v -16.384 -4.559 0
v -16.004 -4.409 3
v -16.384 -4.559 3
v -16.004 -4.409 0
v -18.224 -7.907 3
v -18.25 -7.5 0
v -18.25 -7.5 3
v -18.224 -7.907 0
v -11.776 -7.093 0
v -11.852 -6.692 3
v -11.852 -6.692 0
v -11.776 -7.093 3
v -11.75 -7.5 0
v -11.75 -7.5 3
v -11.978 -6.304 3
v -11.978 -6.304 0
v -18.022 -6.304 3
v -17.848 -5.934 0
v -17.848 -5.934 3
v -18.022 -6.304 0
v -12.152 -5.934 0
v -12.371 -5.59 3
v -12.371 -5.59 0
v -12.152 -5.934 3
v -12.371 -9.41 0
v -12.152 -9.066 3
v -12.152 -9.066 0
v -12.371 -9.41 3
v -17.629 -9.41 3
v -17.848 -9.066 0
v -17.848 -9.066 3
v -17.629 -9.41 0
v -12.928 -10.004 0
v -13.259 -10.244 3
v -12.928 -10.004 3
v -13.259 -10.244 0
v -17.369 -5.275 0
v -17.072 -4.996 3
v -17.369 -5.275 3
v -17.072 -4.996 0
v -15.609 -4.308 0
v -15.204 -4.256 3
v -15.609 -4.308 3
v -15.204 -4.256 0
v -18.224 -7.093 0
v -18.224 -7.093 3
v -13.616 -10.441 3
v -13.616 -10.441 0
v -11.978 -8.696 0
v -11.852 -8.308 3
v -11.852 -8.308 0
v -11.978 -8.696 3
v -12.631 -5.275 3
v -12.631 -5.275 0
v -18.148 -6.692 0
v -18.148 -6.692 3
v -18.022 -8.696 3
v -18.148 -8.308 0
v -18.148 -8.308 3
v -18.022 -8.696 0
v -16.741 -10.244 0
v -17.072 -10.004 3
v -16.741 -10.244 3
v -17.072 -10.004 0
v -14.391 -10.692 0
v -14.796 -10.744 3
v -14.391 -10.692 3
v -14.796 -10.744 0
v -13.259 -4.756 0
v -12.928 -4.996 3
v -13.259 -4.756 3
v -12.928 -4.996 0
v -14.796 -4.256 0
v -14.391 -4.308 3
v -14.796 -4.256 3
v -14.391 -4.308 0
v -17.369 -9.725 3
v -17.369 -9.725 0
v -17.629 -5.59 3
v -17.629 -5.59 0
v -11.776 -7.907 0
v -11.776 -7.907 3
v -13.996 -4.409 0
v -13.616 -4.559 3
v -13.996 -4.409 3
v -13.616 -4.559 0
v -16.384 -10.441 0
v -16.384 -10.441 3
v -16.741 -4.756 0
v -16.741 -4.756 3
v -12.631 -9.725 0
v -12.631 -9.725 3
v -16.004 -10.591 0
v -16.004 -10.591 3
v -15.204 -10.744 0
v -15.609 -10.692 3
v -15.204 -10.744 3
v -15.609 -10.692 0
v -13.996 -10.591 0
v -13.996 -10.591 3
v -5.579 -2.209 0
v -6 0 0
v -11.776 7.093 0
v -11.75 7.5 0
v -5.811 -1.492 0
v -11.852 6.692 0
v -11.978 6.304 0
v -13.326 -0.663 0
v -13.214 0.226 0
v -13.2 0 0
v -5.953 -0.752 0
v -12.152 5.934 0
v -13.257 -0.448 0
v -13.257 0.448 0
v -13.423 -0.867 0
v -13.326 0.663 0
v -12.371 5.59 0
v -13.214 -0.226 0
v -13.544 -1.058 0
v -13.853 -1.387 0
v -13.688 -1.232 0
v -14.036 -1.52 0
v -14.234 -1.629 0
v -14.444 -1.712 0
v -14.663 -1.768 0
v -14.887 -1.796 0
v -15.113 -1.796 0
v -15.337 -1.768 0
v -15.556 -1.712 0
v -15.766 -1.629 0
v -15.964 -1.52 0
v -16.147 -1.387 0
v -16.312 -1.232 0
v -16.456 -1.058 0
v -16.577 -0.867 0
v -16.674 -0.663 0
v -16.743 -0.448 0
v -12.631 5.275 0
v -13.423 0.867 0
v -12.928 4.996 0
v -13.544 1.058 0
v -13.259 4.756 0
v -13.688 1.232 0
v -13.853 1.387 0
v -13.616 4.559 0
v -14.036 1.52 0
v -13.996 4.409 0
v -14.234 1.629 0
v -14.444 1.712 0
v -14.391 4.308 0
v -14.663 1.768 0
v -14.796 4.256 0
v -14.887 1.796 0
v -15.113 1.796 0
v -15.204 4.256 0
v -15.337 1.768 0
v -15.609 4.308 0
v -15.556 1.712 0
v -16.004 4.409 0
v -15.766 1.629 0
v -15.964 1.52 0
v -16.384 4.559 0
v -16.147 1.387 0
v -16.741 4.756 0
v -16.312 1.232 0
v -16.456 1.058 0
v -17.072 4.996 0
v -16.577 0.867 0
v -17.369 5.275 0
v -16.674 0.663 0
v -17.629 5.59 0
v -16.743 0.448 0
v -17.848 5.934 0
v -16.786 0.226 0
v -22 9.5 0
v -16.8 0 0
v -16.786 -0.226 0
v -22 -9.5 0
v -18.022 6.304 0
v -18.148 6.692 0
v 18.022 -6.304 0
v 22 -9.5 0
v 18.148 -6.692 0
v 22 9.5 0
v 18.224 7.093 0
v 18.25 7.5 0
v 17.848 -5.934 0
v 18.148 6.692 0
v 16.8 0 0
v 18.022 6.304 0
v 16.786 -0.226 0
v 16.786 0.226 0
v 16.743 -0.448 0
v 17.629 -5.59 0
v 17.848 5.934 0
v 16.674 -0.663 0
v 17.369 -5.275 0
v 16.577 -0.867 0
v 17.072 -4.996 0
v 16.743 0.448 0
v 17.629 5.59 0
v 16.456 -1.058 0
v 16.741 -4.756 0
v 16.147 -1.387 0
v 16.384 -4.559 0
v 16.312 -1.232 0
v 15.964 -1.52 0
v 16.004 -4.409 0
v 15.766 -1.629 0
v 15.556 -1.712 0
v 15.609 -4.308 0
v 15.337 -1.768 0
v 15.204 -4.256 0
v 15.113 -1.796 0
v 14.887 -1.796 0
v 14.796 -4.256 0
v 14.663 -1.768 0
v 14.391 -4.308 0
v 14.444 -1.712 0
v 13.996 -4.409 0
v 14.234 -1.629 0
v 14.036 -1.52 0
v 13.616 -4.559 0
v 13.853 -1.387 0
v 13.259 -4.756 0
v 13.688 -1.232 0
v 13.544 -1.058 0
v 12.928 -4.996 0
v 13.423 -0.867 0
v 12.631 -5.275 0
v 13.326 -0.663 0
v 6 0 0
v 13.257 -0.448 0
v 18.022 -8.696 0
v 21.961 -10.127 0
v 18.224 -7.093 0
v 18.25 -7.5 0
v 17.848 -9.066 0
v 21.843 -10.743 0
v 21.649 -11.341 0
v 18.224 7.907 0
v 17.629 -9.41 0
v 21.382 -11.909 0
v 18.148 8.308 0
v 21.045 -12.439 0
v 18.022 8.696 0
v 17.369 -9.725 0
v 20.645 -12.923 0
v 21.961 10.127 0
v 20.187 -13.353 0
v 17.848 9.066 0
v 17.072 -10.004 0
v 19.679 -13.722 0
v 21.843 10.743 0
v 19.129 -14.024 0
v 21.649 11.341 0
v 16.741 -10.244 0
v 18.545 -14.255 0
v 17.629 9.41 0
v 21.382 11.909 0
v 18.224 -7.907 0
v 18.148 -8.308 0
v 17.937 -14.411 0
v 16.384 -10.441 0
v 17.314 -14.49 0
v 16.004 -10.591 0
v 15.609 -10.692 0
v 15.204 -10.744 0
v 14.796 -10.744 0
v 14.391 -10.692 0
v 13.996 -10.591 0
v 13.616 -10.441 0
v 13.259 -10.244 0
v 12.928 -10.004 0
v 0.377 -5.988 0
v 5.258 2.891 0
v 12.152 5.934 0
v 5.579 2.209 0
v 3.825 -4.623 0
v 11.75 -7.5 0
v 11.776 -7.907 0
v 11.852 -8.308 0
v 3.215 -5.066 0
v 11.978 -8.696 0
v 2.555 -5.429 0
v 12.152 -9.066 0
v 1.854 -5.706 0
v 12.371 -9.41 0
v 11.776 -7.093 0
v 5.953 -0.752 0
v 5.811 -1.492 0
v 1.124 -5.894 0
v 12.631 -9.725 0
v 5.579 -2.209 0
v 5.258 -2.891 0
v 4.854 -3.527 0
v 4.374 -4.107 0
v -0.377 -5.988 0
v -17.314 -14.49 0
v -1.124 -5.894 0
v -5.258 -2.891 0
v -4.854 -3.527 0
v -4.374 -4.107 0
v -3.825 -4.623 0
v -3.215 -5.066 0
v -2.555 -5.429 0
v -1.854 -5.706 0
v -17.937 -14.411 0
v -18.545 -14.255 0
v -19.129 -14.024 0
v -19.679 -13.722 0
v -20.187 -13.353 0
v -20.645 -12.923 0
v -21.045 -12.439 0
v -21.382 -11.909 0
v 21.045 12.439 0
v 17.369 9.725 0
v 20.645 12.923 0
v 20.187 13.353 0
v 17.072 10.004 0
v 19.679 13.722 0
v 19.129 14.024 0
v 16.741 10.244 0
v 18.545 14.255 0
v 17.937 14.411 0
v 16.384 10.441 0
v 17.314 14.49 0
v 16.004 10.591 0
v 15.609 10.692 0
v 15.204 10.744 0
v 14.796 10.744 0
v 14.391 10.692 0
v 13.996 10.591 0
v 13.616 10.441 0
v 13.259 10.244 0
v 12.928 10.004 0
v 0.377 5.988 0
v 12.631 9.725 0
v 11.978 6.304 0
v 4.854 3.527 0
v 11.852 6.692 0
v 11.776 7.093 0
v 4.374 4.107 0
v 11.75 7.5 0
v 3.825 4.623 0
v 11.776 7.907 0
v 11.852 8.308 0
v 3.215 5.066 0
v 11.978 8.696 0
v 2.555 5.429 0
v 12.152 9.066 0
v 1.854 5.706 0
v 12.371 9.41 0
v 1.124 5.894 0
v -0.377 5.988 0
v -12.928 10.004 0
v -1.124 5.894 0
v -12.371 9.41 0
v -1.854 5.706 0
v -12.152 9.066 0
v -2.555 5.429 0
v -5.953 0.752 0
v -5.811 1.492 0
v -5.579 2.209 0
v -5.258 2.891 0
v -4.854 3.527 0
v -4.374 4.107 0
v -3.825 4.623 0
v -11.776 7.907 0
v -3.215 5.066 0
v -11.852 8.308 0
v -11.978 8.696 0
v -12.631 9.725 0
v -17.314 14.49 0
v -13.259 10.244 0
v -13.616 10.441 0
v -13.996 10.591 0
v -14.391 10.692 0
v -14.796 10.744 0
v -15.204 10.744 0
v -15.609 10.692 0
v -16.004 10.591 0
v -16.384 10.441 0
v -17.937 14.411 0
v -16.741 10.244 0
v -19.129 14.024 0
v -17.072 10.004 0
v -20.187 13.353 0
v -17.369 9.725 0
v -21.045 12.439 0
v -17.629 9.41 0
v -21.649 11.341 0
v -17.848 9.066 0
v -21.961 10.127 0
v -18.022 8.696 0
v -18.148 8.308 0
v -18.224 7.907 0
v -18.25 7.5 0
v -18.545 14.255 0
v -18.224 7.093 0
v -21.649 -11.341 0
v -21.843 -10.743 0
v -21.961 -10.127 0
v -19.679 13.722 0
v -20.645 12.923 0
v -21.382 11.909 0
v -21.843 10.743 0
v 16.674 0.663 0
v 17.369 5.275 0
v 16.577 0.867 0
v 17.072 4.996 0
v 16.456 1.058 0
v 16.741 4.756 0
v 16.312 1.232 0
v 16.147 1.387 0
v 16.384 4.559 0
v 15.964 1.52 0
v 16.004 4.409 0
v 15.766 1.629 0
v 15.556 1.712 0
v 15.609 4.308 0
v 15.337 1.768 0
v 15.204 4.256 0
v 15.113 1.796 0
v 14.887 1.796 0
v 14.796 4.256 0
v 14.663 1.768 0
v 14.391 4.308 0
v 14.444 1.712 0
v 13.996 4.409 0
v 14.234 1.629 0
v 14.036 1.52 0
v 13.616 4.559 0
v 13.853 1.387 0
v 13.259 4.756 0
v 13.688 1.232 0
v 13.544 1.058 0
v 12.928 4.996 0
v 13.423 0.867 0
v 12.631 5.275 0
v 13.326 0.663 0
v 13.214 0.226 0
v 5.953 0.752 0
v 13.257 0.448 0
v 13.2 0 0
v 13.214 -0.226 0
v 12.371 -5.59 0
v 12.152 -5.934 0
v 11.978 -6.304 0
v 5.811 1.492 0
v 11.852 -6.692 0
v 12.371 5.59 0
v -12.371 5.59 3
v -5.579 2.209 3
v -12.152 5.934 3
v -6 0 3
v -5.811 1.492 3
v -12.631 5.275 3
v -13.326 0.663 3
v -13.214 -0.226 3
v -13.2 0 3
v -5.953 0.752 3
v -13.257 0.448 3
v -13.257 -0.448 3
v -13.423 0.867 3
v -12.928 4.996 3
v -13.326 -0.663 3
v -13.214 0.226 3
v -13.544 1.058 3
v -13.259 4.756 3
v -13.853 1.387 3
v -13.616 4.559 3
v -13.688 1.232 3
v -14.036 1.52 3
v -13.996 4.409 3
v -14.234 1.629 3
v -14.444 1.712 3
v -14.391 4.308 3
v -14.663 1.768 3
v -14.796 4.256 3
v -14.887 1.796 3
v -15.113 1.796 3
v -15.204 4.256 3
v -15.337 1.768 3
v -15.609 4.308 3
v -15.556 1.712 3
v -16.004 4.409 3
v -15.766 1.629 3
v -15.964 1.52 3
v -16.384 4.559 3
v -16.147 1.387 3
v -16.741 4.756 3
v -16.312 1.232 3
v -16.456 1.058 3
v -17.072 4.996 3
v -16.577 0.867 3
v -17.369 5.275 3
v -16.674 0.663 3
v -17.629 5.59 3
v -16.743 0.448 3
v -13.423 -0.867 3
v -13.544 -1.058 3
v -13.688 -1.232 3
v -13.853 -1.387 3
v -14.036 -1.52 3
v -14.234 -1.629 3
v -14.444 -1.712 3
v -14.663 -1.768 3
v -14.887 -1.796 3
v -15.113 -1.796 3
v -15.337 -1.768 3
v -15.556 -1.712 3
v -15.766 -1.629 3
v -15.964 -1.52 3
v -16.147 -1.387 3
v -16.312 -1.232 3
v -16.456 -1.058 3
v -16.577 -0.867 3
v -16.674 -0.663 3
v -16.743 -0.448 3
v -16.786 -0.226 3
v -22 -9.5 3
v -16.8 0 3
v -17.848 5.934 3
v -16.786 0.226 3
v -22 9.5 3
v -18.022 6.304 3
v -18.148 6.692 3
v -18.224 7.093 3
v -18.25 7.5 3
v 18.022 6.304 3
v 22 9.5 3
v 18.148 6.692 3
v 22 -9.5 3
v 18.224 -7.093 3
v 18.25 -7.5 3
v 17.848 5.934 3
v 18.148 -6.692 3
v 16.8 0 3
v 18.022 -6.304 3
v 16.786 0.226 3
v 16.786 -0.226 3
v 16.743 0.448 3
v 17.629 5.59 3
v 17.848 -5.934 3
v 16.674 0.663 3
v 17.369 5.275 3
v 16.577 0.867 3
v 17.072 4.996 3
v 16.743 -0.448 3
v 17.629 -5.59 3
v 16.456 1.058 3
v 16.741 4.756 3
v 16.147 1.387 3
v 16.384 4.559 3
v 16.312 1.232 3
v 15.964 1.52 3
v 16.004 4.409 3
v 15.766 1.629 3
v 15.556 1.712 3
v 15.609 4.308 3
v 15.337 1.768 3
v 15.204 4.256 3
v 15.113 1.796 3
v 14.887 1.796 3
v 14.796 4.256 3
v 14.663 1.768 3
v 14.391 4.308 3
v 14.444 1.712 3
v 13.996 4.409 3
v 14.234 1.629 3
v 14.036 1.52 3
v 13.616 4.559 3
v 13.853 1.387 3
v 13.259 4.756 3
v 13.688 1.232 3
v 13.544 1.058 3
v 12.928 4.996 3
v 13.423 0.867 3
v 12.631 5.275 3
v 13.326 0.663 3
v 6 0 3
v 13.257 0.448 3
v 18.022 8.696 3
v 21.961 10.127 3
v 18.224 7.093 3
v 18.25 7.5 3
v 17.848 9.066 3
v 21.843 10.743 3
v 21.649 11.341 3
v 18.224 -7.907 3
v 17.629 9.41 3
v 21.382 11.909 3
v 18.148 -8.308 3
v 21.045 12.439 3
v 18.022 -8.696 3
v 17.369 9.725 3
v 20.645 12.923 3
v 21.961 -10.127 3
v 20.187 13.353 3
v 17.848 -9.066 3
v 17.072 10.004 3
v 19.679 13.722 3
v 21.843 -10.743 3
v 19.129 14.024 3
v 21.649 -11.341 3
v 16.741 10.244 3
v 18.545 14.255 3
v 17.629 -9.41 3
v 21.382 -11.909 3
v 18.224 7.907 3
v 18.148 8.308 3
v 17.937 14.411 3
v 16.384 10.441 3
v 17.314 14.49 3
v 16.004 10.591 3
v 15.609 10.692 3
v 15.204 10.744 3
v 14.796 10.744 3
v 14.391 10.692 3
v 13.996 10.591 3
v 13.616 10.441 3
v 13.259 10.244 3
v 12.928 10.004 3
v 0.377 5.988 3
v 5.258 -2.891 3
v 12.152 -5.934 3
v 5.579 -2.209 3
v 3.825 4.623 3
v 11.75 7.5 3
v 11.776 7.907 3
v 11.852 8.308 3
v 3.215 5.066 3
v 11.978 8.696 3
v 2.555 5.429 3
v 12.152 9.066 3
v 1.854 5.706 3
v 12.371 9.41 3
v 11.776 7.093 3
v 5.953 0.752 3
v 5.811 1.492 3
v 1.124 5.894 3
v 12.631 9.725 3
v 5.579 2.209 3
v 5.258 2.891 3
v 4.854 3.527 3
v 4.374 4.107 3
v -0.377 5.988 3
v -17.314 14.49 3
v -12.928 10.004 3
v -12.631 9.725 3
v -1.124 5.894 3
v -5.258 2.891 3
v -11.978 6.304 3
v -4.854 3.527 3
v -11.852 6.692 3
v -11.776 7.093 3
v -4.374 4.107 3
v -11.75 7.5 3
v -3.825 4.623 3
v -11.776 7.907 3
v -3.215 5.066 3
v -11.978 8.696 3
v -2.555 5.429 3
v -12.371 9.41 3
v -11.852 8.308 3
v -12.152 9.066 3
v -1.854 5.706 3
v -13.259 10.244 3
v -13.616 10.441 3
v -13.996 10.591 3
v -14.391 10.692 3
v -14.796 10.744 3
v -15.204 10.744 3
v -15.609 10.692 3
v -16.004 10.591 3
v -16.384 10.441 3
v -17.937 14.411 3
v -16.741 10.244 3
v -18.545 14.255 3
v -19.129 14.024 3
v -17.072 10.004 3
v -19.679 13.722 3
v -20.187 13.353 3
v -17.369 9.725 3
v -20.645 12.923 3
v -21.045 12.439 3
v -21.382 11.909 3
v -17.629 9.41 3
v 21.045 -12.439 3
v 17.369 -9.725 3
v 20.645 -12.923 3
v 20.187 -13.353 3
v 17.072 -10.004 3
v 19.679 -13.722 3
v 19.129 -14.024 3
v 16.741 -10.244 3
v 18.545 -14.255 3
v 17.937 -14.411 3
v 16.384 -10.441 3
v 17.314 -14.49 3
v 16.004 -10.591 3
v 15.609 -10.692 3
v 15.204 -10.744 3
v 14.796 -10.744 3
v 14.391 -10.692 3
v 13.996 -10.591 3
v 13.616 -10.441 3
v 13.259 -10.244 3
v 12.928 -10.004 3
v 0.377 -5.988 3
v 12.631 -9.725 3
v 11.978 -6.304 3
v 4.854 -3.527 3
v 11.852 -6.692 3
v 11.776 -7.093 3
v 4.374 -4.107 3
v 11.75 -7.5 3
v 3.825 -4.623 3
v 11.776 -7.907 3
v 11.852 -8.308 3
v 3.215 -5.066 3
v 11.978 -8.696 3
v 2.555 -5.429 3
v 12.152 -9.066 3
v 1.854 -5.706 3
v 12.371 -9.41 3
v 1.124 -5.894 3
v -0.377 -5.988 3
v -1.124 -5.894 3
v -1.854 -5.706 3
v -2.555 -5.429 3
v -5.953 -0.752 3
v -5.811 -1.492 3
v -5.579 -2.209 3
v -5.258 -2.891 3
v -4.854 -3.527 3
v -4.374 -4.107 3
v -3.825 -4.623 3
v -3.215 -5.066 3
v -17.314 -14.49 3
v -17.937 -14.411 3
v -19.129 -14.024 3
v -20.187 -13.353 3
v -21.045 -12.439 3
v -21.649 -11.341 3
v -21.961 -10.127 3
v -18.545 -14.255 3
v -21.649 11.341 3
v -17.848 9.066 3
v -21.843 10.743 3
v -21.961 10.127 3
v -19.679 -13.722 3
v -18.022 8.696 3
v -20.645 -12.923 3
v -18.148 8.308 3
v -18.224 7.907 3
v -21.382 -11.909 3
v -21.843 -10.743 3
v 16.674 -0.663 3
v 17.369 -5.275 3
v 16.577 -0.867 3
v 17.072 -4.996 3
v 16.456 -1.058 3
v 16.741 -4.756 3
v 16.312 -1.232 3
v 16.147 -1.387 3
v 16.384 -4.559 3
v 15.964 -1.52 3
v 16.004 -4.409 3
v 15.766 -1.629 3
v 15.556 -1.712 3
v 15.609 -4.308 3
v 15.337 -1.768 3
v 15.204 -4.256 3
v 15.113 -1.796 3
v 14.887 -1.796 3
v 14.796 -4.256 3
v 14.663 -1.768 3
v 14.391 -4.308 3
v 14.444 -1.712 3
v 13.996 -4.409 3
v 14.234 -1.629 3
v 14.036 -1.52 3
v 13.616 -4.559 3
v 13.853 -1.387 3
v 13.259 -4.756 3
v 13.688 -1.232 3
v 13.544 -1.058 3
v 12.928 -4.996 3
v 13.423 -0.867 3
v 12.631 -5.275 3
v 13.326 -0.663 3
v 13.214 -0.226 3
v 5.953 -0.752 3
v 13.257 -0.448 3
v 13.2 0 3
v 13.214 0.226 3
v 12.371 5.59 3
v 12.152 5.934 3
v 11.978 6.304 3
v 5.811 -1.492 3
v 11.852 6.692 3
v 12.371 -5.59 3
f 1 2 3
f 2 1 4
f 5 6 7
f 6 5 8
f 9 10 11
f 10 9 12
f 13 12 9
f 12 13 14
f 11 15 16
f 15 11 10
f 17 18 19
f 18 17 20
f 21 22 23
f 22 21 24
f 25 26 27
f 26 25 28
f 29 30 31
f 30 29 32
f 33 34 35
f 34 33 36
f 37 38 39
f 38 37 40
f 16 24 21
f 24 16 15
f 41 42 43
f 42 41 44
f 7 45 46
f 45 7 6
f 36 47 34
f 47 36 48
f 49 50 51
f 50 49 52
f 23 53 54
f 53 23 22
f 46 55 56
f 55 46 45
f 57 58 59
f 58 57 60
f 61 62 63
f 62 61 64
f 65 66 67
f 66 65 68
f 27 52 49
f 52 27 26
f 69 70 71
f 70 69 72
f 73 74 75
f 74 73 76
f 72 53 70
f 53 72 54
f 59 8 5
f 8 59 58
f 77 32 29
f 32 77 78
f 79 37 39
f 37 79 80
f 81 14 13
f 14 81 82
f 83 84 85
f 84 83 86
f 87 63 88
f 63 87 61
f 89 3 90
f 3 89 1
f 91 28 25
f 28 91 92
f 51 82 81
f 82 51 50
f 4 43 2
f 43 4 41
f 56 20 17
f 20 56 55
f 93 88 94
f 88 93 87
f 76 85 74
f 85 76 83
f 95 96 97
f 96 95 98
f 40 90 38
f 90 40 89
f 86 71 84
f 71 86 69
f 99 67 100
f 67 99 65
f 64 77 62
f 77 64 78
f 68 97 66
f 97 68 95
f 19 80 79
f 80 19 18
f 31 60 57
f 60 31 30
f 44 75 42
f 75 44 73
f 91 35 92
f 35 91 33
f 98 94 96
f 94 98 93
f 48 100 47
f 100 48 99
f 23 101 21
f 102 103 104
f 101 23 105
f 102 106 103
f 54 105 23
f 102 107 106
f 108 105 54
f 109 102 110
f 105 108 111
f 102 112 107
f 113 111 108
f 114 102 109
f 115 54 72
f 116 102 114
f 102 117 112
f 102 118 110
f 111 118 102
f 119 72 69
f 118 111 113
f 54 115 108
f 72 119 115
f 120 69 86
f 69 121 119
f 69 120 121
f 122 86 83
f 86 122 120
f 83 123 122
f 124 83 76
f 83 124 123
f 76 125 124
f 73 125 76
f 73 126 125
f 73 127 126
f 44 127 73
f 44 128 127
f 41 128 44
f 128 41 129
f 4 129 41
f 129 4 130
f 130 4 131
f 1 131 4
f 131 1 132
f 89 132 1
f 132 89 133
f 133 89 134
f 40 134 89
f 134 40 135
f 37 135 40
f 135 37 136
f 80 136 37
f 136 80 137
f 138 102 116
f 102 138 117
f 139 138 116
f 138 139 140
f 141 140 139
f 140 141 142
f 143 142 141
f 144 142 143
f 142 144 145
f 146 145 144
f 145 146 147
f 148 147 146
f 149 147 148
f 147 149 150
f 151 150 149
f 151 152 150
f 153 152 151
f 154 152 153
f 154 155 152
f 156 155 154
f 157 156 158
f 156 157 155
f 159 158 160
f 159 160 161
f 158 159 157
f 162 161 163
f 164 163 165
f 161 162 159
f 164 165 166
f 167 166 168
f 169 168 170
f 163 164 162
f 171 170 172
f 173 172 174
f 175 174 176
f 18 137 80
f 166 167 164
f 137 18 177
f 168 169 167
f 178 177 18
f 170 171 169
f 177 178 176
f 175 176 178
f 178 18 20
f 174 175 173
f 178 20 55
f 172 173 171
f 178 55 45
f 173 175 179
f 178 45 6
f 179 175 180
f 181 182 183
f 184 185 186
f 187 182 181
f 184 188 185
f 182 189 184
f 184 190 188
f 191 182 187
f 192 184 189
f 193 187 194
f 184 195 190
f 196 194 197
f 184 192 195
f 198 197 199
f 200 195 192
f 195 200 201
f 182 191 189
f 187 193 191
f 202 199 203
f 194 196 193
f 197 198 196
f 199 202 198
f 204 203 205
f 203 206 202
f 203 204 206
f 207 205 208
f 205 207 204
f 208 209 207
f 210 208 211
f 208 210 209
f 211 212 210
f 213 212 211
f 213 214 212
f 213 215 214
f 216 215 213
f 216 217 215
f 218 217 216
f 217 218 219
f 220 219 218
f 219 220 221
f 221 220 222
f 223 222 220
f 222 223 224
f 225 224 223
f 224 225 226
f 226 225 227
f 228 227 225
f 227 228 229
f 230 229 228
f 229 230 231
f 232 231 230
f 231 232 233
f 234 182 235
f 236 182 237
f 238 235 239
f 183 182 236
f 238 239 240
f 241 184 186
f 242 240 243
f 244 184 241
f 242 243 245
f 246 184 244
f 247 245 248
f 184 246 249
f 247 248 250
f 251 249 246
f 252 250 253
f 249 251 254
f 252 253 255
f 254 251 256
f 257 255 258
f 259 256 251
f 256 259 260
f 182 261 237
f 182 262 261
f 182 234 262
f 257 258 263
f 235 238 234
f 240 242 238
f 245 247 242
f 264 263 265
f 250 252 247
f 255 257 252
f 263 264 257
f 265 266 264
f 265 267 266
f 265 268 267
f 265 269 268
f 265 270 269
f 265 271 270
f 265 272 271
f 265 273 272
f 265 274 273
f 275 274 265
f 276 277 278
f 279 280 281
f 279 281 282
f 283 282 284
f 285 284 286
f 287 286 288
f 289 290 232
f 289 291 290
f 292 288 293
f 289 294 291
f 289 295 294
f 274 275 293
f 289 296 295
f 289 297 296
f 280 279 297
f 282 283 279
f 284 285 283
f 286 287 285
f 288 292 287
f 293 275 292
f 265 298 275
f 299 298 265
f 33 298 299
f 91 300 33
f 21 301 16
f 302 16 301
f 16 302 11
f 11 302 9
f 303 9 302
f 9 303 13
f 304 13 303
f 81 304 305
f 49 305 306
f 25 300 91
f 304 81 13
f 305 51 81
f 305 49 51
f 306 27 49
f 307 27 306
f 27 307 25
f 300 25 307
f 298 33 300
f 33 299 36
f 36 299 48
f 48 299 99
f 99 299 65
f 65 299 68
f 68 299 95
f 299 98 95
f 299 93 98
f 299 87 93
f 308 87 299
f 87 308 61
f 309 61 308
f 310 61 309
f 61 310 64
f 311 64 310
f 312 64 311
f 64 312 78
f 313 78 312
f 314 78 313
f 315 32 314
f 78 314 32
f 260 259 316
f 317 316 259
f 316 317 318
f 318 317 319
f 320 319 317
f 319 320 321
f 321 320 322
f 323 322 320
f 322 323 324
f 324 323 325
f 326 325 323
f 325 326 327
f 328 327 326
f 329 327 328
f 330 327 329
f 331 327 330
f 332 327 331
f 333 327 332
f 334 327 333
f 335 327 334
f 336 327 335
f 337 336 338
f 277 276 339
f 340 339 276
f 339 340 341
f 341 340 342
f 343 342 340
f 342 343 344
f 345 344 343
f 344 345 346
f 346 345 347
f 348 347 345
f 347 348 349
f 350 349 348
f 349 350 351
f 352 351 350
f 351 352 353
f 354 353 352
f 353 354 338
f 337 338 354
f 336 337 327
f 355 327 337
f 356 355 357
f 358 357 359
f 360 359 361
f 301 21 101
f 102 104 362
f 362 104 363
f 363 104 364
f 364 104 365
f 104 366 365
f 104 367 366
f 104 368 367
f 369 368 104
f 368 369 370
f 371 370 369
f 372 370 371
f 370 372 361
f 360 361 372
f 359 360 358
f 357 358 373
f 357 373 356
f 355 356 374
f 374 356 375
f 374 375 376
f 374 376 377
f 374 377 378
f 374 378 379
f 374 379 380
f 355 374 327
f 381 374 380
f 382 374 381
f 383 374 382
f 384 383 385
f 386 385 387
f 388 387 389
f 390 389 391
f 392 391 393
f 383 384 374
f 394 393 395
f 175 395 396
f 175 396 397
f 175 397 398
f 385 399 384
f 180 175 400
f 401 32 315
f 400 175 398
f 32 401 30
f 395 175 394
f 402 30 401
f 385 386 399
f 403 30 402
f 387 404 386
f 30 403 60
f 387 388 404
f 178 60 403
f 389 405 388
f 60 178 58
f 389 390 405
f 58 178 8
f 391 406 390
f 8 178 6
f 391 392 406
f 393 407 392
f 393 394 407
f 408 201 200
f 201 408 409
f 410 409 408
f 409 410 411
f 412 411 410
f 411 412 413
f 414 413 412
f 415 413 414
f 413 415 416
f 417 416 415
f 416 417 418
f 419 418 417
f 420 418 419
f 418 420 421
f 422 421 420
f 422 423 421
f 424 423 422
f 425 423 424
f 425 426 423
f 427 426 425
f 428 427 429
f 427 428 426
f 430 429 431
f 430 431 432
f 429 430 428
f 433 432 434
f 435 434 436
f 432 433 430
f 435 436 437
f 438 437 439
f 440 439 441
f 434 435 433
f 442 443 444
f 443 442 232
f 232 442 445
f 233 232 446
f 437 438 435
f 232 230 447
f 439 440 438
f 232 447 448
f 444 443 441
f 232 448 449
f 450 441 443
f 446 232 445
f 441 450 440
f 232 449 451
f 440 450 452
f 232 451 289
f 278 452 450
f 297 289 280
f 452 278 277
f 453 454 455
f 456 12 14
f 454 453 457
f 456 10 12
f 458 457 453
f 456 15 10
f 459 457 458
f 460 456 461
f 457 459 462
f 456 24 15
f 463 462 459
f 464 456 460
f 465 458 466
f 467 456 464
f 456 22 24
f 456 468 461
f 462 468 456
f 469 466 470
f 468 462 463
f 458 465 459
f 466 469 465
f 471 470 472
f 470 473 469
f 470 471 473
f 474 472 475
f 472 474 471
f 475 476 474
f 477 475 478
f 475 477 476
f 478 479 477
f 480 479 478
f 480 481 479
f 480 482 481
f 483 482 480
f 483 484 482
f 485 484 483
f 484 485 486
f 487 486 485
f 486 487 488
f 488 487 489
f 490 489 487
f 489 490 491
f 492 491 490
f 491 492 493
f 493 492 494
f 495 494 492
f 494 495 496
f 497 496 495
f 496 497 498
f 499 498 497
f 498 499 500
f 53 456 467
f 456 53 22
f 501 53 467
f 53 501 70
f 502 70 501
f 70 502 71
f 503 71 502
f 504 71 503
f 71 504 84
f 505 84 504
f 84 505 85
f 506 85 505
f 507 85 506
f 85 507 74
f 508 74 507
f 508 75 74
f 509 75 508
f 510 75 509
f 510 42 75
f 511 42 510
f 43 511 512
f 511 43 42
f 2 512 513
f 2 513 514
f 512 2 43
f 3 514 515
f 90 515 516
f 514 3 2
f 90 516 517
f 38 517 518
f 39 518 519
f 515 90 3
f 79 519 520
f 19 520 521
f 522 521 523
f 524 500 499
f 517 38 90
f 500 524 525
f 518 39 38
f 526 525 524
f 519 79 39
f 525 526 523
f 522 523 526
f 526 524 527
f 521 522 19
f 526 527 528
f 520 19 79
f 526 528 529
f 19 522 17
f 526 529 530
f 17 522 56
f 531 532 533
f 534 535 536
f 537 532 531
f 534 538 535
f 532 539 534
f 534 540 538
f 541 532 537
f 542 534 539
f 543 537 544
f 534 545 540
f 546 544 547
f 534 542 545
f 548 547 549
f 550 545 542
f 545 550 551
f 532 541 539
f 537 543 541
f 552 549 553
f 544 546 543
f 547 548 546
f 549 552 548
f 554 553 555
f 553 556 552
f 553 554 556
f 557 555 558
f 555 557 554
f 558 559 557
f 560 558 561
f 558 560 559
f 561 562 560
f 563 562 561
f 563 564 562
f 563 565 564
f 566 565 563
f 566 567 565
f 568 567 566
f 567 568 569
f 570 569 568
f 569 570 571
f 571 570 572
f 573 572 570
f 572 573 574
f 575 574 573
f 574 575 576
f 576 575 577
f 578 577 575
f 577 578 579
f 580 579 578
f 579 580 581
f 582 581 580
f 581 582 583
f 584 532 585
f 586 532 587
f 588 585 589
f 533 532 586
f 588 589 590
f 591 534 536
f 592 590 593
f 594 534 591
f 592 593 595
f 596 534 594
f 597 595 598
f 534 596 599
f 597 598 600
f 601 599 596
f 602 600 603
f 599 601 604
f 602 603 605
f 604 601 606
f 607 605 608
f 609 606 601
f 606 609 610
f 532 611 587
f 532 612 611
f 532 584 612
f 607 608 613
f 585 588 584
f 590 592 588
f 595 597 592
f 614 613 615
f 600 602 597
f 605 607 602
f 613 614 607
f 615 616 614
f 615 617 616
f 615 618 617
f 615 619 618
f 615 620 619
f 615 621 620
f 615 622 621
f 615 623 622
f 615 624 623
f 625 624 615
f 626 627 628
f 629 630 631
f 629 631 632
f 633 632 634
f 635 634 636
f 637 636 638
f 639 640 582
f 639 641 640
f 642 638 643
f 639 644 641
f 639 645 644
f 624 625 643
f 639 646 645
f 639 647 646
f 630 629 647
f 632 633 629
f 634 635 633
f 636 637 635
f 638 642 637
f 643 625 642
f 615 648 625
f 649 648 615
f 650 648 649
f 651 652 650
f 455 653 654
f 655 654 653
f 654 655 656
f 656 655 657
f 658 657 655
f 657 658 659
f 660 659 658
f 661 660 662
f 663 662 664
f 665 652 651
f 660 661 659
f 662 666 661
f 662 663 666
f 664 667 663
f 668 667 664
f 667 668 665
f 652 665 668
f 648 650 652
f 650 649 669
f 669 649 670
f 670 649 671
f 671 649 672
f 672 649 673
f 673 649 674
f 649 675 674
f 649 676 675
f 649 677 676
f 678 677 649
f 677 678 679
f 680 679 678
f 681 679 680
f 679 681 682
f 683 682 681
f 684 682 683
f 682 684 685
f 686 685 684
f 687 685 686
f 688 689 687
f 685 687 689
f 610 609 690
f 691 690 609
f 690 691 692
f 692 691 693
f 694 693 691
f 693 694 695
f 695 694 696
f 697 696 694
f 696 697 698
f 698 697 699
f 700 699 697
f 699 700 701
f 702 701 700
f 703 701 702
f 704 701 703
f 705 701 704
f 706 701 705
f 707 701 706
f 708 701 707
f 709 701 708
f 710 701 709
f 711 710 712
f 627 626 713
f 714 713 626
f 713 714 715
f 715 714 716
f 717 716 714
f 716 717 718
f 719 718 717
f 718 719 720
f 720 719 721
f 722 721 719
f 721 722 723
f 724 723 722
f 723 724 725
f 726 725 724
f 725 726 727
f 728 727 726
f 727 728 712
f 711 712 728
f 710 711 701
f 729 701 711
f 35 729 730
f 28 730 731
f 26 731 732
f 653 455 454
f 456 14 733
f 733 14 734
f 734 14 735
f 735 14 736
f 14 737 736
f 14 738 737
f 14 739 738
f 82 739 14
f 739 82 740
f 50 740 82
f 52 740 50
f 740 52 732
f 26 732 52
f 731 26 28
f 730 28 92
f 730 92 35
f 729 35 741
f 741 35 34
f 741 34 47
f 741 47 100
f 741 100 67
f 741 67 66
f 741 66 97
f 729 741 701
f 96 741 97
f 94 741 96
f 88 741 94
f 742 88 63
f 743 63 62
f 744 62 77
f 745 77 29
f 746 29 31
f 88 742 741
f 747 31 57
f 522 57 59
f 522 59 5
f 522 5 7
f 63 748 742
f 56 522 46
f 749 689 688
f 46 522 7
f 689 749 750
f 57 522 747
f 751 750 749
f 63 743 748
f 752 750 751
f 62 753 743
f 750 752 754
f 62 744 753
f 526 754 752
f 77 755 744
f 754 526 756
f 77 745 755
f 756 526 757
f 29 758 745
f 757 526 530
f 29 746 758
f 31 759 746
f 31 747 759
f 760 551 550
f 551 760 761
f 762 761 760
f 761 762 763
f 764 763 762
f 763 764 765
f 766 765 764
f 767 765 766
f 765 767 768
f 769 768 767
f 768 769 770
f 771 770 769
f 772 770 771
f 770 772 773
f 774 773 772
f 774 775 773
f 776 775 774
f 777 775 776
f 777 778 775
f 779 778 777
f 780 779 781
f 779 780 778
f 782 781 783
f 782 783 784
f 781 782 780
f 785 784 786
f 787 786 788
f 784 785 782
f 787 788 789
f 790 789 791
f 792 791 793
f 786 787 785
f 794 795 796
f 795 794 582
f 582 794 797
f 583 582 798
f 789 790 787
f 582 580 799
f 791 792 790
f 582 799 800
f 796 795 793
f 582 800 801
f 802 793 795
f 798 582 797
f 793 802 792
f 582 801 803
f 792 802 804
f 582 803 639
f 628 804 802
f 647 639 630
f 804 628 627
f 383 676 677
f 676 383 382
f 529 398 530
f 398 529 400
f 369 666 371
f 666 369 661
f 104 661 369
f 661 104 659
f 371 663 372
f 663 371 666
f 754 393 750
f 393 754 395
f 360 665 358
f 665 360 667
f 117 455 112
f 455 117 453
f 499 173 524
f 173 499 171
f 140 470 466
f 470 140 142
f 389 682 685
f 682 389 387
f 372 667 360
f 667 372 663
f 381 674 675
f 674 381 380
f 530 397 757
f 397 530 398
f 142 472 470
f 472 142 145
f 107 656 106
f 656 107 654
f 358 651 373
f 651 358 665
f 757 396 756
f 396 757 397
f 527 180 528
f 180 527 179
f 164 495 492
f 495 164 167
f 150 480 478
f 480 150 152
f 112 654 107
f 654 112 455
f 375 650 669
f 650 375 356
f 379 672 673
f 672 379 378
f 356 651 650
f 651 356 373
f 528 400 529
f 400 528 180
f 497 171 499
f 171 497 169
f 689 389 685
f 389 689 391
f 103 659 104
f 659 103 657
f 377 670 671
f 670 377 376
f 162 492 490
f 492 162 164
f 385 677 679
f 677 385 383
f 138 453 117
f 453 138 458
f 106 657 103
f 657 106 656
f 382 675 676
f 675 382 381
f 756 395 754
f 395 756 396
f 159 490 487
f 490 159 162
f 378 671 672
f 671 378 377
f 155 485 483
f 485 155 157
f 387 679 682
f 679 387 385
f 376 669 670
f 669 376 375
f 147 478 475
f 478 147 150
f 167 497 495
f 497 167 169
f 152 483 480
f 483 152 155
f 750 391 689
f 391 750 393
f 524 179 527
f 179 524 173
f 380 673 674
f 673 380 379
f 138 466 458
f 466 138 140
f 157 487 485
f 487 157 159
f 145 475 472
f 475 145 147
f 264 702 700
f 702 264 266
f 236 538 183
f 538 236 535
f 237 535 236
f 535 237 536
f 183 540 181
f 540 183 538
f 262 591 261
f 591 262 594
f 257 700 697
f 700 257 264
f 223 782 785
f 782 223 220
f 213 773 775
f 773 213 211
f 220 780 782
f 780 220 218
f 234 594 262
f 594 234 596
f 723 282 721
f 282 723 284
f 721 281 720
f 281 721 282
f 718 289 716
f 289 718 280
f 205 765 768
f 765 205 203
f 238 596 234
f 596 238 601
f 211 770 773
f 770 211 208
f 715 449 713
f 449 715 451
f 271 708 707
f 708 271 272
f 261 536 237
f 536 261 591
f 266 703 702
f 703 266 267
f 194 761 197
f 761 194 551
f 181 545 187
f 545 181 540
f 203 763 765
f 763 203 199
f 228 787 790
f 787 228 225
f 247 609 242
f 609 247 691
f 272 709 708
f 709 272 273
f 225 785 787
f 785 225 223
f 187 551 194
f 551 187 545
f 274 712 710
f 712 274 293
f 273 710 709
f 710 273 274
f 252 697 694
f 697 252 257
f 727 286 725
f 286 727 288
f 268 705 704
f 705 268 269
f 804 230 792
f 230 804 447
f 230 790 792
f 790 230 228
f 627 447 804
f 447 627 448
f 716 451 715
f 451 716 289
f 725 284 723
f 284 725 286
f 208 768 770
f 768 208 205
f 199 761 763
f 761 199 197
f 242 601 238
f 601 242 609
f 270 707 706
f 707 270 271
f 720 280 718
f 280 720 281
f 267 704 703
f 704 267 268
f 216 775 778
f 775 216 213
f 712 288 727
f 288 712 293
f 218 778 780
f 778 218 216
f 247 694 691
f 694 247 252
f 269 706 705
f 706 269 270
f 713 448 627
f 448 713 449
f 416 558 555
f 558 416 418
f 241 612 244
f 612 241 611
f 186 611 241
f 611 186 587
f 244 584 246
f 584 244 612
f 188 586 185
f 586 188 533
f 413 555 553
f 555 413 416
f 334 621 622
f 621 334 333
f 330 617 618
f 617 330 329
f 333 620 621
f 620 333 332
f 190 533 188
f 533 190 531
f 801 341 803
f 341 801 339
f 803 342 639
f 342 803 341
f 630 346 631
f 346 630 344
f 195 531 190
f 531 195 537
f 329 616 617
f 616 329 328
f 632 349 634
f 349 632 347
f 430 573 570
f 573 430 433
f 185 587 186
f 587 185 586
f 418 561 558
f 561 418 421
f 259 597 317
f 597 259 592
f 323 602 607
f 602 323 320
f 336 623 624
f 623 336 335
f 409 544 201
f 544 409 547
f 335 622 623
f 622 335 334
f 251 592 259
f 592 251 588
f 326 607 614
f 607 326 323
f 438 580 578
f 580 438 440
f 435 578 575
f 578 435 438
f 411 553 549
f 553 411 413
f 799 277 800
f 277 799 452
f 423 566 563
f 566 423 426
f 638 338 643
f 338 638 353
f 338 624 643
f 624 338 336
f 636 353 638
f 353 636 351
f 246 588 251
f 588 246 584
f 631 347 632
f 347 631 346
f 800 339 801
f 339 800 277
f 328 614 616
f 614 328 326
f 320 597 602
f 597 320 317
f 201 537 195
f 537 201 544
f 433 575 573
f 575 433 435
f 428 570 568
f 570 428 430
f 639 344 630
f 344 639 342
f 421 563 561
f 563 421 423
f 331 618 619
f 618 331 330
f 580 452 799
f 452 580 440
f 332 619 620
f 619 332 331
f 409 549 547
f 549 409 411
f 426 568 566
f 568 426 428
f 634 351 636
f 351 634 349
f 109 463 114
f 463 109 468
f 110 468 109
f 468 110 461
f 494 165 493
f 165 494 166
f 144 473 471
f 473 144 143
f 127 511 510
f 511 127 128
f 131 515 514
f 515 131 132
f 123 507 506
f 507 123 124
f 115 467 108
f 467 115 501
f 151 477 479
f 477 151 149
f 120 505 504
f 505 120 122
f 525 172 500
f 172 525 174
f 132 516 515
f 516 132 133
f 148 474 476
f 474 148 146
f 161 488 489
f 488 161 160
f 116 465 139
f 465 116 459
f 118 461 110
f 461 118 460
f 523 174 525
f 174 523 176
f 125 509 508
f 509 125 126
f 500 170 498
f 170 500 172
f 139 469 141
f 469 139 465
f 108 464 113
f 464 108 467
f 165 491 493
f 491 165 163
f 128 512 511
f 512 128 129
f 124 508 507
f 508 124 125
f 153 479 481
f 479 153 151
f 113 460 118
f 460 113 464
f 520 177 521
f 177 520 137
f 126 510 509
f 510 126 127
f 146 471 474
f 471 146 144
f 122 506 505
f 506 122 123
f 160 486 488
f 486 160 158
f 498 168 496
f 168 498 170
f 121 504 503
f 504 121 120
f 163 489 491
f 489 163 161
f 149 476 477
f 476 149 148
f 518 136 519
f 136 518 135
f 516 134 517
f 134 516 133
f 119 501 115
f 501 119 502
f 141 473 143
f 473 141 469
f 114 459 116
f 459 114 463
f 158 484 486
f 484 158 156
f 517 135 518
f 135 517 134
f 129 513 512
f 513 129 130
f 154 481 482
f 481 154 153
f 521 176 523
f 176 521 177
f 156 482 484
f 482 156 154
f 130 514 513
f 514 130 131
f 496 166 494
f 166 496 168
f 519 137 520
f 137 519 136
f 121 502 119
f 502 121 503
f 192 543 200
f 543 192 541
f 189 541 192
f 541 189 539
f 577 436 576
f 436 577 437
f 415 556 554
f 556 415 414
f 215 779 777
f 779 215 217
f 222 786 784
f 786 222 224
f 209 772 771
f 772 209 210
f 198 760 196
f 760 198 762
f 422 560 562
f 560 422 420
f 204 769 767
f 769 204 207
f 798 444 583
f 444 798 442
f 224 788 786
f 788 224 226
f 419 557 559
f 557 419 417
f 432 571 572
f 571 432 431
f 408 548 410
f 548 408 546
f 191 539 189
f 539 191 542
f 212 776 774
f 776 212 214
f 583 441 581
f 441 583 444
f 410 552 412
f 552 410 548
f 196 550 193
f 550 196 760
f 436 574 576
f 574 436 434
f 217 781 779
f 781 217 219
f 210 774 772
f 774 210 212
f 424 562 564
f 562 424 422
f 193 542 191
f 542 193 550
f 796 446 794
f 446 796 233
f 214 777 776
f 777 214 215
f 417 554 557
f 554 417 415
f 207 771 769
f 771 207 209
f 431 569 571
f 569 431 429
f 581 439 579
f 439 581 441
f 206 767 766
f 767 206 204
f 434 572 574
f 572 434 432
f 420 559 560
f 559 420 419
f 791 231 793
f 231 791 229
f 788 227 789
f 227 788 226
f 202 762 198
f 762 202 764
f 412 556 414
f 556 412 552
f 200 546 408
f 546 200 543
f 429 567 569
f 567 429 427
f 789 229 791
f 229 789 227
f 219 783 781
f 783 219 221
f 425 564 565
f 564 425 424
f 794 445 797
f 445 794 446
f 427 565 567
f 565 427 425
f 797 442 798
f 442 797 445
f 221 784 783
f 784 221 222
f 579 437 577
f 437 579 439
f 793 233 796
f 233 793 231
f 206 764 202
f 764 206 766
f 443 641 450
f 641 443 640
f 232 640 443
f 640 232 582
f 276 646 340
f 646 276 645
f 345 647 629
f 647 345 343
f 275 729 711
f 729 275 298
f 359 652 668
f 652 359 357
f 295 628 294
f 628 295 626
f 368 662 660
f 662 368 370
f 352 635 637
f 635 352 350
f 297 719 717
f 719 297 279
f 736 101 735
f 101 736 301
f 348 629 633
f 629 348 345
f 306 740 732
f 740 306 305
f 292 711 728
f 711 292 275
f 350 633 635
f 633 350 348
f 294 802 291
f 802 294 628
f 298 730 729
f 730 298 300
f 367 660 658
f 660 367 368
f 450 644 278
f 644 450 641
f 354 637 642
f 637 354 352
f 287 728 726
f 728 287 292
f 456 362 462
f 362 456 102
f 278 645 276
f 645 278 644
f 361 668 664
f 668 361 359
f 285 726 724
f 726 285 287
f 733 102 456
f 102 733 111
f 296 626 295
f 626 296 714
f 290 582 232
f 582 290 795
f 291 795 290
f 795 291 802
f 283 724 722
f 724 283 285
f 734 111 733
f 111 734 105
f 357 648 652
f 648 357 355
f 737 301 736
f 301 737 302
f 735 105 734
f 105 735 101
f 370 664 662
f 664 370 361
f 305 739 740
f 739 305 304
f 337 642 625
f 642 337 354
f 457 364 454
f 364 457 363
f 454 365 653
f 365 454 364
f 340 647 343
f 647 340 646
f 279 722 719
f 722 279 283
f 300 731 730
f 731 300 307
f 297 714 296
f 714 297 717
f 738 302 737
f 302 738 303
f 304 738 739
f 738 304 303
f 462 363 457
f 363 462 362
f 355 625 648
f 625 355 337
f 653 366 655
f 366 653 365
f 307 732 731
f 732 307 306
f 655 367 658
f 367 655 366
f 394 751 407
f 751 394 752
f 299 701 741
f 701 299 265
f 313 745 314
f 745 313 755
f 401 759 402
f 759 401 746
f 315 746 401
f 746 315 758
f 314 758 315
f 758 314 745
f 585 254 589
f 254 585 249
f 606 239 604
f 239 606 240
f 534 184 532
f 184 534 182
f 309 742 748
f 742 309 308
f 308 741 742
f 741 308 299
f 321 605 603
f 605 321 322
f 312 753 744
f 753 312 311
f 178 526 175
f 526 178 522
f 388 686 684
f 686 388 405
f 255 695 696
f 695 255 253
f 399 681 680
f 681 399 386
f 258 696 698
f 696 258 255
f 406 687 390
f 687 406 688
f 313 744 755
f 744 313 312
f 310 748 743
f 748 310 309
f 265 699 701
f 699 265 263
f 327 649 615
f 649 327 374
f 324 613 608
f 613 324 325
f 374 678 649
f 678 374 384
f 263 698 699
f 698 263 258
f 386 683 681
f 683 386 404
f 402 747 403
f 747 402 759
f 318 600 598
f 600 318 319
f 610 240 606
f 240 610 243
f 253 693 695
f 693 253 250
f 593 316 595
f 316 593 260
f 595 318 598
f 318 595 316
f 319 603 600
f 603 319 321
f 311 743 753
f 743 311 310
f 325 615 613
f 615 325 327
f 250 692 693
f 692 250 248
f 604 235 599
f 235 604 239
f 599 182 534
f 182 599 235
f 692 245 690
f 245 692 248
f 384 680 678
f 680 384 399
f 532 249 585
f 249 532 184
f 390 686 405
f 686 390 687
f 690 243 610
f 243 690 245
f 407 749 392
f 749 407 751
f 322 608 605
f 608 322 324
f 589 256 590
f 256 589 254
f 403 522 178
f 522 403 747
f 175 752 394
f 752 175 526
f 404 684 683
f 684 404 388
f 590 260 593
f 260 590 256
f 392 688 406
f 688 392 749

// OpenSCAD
$fn = 50;

difference() {
	union() {
		hull() {
			translate(v = [-17.0, 9.5, 0]) {
				cylinder(h = 3, r = 5);
			}
			translate(v = [17.0, 9.5, 0]) {
				cylinder(h = 3, r = 5);
			}
			translate(v = [-17.0, -9.5, 0]) {
				cylinder(h = 3, r = 5);
			}
			translate(v = [17.0, -9.5, 0]) {
				cylinder(h = 3, r = 5);
			}
		}
	}
	union() {
		translate(v = [-15.0, -7.5, 0]) {
			cylinder(h = 3, r = 3.25);
		}
		translate(v = [-15.0, 7.5, 0]) {
			cylinder(h = 3, r = 3.25);
		}
		translate(v = [15.0, -7.5, 0]) {
			cylinder(h = 3, r = 3.25);
		}
		translate(v = [15.0, 7.5, 0]) {
			cylinder(h = 3, r = 3.25);
		}
		translate(v = [-15.0, 0.0, 0]) {
			cylinder(h = 3, r = 1.8);
		}
		translate(v = [15.0, 0.0, 0]) {
			cylinder(h = 3, r = 1.8);
		}
		cylinder(h = 3, r = 6.0);
	}
}
